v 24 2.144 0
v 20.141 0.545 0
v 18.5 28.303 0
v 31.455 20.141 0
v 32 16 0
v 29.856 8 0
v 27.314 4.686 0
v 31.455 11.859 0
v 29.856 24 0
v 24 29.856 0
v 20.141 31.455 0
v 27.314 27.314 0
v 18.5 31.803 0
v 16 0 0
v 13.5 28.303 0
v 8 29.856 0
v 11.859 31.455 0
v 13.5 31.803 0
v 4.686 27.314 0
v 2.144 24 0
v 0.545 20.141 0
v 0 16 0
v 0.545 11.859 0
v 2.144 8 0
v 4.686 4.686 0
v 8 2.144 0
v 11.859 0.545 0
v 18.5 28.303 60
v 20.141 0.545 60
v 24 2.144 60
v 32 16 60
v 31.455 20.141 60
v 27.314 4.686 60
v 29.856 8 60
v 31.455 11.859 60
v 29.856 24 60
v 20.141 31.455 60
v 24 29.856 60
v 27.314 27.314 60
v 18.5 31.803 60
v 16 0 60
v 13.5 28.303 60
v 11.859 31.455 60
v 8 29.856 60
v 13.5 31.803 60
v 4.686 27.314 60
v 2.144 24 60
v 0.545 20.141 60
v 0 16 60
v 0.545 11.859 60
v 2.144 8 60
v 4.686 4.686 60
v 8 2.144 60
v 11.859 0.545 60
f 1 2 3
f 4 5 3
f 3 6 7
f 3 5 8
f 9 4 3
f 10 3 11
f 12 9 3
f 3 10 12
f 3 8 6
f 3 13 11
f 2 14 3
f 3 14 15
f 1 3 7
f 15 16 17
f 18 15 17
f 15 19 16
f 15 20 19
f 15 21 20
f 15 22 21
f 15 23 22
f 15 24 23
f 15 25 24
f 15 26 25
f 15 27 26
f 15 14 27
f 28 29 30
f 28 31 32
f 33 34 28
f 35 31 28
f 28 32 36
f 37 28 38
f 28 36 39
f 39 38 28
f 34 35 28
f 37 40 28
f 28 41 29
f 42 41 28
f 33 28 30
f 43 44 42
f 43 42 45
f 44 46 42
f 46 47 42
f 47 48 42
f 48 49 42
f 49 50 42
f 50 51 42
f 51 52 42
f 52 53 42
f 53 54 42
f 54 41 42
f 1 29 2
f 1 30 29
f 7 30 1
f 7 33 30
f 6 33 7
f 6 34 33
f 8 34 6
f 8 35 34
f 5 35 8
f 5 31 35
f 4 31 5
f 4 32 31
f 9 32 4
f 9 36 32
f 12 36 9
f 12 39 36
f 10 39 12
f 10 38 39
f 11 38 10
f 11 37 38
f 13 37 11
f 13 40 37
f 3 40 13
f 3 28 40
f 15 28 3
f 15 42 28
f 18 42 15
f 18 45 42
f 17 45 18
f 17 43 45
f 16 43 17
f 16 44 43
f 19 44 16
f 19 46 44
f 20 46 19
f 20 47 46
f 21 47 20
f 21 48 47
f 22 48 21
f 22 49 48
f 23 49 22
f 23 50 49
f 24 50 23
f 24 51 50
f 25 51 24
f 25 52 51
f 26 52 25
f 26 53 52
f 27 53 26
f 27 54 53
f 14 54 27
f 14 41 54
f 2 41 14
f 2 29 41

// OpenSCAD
$fn = 32;

// ----------------------------------------------------------------------
// Keyway shaft: d32 shaft, key 5 x 3.5 mm
// ----------------------------------------------------------------------

// --- parameters (mm) ---
shaft_r = 16;             // shaft radius
key_w = 5;                // keyway width
key_d = 3.5;              // keyway depth below the surface line
plate_t = 60;             // shaft length, Z (extrusion height)
fit_tol = 0.1;            // declared fit tolerance (prompt contract)
free_tol = 0.3;           // declared free tolerance (prompt contract)

shaft_d = 2 * shaft_r;  // shaft diameter
circle_step = 15;  // polygon sampling step, degrees

profile = [[11.859, 31.455], [8, 29.856], [4.686, 27.314], [2.144, 24], [0.545, 20.141], [0, 16], [0.545, 11.859], [2.144, 8], [4.686, 4.686], [8, 2.144], [11.859, 0.545], [16, 0], [20.141, 0.545], [24, 2.144], [27.314, 4.686], [29.856, 8], [31.455, 11.859], [32, 16], [31.455, 20.141], [29.856, 24], [27.314, 27.314], [24, 29.856], [20.141, 31.455], [18.5, 31.803], [18.5, 28.303], [13.5, 28.303], [13.5, 31.803]];  // primary outline, 27 points, counter clockwise

// --- the one profile operation ---
linear_extrude(height = plate_t) polygon(points = profile);
